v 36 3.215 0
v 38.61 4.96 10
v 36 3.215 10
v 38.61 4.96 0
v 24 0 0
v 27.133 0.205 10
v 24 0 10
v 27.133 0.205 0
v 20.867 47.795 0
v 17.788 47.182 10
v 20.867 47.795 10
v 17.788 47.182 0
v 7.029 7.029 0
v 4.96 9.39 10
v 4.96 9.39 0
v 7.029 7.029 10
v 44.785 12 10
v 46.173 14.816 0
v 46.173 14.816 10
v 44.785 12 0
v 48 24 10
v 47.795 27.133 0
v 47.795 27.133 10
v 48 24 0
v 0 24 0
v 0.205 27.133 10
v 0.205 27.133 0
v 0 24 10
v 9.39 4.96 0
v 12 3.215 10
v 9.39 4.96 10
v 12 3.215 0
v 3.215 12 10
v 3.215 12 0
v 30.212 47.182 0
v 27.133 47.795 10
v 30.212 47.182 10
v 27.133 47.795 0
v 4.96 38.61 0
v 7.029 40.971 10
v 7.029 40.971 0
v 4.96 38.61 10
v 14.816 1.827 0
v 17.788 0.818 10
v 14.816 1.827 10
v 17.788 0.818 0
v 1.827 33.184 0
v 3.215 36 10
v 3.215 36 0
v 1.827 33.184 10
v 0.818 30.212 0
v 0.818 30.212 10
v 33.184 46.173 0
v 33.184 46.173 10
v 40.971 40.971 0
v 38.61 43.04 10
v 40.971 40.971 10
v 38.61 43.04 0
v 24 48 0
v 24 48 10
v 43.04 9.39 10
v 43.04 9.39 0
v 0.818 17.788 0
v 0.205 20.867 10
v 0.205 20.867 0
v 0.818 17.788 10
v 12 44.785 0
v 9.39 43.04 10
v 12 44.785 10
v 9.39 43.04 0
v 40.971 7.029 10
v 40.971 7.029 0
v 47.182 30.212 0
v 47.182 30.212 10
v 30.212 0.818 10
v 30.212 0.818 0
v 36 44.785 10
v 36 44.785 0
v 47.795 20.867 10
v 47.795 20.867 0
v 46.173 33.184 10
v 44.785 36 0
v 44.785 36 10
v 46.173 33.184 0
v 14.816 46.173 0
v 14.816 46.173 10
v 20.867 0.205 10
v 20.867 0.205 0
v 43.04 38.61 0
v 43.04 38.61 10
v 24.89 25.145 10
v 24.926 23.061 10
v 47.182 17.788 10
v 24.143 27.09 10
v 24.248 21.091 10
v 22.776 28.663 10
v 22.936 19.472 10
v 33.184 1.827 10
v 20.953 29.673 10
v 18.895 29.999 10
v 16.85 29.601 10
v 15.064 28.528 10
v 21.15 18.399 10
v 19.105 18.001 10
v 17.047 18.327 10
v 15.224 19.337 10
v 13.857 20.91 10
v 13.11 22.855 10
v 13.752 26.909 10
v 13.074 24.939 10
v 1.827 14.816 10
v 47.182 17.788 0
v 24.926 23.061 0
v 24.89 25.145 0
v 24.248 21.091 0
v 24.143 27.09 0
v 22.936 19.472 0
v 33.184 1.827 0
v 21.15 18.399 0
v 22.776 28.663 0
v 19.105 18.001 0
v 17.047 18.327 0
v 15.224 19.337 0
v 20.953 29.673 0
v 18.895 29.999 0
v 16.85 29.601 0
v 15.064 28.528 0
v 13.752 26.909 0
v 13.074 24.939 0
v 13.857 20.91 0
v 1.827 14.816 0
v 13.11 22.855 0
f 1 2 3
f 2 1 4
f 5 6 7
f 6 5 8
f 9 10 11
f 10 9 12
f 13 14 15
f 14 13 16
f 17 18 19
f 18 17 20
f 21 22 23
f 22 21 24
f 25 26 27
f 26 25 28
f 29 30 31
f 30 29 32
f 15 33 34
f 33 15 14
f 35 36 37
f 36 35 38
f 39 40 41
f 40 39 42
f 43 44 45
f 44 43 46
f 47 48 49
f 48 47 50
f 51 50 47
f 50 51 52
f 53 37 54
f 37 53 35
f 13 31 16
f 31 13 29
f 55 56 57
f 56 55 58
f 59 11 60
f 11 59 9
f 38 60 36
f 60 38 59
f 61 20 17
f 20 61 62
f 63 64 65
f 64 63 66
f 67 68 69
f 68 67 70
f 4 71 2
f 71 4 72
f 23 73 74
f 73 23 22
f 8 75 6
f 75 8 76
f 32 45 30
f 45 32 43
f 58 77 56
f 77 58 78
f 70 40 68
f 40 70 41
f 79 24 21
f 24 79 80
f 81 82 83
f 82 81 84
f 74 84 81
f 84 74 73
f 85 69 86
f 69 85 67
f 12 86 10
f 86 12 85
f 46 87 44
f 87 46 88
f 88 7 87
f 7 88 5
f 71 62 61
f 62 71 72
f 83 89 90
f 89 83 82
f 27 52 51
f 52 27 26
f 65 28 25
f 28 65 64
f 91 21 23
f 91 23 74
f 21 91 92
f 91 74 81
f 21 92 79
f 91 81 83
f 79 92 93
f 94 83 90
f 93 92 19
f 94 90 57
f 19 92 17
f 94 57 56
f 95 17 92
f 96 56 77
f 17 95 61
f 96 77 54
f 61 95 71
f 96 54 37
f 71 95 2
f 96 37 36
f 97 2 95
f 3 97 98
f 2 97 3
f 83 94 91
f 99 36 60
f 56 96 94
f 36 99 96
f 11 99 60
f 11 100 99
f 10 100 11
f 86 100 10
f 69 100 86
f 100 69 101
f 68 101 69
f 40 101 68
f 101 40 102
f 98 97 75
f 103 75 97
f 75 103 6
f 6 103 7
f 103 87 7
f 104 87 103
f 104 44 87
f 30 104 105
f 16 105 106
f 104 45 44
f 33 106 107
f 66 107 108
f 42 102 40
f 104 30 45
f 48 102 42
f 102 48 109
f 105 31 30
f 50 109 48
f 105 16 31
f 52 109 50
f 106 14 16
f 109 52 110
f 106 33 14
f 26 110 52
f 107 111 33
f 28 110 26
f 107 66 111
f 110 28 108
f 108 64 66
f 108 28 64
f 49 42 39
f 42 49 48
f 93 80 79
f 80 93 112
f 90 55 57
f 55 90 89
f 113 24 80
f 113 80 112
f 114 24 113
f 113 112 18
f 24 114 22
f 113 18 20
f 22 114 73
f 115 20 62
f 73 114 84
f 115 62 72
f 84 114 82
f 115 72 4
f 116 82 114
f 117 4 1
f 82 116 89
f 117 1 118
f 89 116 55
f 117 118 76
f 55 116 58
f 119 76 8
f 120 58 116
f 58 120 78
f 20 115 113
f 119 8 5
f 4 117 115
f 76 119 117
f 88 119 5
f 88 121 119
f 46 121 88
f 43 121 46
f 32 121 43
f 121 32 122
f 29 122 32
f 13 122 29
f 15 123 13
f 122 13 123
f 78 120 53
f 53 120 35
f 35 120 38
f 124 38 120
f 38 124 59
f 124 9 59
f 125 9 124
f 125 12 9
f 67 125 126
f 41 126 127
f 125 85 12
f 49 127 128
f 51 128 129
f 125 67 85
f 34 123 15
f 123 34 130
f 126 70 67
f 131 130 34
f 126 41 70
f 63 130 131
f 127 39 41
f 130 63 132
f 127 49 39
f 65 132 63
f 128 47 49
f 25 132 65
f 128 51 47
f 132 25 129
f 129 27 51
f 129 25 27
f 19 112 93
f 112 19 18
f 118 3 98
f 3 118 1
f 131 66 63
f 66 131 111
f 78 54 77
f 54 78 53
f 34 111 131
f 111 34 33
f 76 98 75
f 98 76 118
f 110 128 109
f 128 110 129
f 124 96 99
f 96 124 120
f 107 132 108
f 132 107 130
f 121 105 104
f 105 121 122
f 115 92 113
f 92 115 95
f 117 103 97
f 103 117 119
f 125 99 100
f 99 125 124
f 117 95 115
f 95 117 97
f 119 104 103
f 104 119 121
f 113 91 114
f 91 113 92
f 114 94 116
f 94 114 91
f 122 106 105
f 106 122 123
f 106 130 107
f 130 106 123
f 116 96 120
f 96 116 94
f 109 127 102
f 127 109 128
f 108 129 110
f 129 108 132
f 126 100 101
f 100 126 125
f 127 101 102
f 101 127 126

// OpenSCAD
$fn = 32;

// ----------------------------------------------------------------------
// Cam plate: eccentric cam, base R24
// ----------------------------------------------------------------------

// --- parameters (mm) ---
base_r = 24;              // base circle radius
lobe_h = 12;              // cam lobe rise
bore_r = 6;               // shaft bore radius
plate_t = 10;             // plate thickness, Z (extrusion height)
ecc = 5;                  // disc eccentricity

profile = [[48, 24], [47.795, 27.133], [47.182, 30.212], [46.173, 33.184], [44.785, 36], [43.04, 38.61], [40.971, 40.971], [38.61, 43.04], [36, 44.785], [33.184, 46.173], [30.212, 47.182], [27.133, 47.795], [24, 48], [20.867, 47.795], [17.788, 47.182], [14.816, 46.173], [12, 44.785], [9.39, 43.04], [7.029, 40.971], [4.96, 38.61], [3.215, 36], [1.827, 33.184], [0.818, 30.212], [0.205, 27.133], [0, 24], [0.205, 20.867], [0.818, 17.788], [1.827, 14.816], [3.215, 12], [4.96, 9.39], [7.029, 7.029], [9.39, 4.96], [12, 3.215], [14.816, 1.827], [17.788, 0.818], [20.867, 0.205], [24, 0], [27.133, 0.205], [30.212, 0.818], [33.184, 1.827], [36, 3.215], [38.61, 4.96], [40.971, 7.029], [43.04, 9.39], [44.785, 12], [46.173, 14.816], [47.182, 17.788], [47.795, 20.867]];  // primary outline, 48 points, counter clockwise
void_1 = [[24.89, 25.145], [24.143, 27.09], [22.776, 28.663], [20.953, 29.673], [18.895, 29.999], [16.85, 29.601], [15.064, 28.528], [13.752, 26.909], [13.074, 24.939], [13.11, 22.855], [13.857, 20.91], [15.224, 19.337], [17.047, 18.327], [19.105, 18.001], [21.15, 18.399], [22.936, 19.472], [24.248, 21.091], [24.926, 23.061]];  // shaft bore, 18 points

// --- the one profile operation ---
difference() {
  linear_extrude(height = plate_t) polygon(points = profile);
  translate([0, 0, -1])
    linear_extrude(height = plate_t + 2) polygon(points = void_1);
}
